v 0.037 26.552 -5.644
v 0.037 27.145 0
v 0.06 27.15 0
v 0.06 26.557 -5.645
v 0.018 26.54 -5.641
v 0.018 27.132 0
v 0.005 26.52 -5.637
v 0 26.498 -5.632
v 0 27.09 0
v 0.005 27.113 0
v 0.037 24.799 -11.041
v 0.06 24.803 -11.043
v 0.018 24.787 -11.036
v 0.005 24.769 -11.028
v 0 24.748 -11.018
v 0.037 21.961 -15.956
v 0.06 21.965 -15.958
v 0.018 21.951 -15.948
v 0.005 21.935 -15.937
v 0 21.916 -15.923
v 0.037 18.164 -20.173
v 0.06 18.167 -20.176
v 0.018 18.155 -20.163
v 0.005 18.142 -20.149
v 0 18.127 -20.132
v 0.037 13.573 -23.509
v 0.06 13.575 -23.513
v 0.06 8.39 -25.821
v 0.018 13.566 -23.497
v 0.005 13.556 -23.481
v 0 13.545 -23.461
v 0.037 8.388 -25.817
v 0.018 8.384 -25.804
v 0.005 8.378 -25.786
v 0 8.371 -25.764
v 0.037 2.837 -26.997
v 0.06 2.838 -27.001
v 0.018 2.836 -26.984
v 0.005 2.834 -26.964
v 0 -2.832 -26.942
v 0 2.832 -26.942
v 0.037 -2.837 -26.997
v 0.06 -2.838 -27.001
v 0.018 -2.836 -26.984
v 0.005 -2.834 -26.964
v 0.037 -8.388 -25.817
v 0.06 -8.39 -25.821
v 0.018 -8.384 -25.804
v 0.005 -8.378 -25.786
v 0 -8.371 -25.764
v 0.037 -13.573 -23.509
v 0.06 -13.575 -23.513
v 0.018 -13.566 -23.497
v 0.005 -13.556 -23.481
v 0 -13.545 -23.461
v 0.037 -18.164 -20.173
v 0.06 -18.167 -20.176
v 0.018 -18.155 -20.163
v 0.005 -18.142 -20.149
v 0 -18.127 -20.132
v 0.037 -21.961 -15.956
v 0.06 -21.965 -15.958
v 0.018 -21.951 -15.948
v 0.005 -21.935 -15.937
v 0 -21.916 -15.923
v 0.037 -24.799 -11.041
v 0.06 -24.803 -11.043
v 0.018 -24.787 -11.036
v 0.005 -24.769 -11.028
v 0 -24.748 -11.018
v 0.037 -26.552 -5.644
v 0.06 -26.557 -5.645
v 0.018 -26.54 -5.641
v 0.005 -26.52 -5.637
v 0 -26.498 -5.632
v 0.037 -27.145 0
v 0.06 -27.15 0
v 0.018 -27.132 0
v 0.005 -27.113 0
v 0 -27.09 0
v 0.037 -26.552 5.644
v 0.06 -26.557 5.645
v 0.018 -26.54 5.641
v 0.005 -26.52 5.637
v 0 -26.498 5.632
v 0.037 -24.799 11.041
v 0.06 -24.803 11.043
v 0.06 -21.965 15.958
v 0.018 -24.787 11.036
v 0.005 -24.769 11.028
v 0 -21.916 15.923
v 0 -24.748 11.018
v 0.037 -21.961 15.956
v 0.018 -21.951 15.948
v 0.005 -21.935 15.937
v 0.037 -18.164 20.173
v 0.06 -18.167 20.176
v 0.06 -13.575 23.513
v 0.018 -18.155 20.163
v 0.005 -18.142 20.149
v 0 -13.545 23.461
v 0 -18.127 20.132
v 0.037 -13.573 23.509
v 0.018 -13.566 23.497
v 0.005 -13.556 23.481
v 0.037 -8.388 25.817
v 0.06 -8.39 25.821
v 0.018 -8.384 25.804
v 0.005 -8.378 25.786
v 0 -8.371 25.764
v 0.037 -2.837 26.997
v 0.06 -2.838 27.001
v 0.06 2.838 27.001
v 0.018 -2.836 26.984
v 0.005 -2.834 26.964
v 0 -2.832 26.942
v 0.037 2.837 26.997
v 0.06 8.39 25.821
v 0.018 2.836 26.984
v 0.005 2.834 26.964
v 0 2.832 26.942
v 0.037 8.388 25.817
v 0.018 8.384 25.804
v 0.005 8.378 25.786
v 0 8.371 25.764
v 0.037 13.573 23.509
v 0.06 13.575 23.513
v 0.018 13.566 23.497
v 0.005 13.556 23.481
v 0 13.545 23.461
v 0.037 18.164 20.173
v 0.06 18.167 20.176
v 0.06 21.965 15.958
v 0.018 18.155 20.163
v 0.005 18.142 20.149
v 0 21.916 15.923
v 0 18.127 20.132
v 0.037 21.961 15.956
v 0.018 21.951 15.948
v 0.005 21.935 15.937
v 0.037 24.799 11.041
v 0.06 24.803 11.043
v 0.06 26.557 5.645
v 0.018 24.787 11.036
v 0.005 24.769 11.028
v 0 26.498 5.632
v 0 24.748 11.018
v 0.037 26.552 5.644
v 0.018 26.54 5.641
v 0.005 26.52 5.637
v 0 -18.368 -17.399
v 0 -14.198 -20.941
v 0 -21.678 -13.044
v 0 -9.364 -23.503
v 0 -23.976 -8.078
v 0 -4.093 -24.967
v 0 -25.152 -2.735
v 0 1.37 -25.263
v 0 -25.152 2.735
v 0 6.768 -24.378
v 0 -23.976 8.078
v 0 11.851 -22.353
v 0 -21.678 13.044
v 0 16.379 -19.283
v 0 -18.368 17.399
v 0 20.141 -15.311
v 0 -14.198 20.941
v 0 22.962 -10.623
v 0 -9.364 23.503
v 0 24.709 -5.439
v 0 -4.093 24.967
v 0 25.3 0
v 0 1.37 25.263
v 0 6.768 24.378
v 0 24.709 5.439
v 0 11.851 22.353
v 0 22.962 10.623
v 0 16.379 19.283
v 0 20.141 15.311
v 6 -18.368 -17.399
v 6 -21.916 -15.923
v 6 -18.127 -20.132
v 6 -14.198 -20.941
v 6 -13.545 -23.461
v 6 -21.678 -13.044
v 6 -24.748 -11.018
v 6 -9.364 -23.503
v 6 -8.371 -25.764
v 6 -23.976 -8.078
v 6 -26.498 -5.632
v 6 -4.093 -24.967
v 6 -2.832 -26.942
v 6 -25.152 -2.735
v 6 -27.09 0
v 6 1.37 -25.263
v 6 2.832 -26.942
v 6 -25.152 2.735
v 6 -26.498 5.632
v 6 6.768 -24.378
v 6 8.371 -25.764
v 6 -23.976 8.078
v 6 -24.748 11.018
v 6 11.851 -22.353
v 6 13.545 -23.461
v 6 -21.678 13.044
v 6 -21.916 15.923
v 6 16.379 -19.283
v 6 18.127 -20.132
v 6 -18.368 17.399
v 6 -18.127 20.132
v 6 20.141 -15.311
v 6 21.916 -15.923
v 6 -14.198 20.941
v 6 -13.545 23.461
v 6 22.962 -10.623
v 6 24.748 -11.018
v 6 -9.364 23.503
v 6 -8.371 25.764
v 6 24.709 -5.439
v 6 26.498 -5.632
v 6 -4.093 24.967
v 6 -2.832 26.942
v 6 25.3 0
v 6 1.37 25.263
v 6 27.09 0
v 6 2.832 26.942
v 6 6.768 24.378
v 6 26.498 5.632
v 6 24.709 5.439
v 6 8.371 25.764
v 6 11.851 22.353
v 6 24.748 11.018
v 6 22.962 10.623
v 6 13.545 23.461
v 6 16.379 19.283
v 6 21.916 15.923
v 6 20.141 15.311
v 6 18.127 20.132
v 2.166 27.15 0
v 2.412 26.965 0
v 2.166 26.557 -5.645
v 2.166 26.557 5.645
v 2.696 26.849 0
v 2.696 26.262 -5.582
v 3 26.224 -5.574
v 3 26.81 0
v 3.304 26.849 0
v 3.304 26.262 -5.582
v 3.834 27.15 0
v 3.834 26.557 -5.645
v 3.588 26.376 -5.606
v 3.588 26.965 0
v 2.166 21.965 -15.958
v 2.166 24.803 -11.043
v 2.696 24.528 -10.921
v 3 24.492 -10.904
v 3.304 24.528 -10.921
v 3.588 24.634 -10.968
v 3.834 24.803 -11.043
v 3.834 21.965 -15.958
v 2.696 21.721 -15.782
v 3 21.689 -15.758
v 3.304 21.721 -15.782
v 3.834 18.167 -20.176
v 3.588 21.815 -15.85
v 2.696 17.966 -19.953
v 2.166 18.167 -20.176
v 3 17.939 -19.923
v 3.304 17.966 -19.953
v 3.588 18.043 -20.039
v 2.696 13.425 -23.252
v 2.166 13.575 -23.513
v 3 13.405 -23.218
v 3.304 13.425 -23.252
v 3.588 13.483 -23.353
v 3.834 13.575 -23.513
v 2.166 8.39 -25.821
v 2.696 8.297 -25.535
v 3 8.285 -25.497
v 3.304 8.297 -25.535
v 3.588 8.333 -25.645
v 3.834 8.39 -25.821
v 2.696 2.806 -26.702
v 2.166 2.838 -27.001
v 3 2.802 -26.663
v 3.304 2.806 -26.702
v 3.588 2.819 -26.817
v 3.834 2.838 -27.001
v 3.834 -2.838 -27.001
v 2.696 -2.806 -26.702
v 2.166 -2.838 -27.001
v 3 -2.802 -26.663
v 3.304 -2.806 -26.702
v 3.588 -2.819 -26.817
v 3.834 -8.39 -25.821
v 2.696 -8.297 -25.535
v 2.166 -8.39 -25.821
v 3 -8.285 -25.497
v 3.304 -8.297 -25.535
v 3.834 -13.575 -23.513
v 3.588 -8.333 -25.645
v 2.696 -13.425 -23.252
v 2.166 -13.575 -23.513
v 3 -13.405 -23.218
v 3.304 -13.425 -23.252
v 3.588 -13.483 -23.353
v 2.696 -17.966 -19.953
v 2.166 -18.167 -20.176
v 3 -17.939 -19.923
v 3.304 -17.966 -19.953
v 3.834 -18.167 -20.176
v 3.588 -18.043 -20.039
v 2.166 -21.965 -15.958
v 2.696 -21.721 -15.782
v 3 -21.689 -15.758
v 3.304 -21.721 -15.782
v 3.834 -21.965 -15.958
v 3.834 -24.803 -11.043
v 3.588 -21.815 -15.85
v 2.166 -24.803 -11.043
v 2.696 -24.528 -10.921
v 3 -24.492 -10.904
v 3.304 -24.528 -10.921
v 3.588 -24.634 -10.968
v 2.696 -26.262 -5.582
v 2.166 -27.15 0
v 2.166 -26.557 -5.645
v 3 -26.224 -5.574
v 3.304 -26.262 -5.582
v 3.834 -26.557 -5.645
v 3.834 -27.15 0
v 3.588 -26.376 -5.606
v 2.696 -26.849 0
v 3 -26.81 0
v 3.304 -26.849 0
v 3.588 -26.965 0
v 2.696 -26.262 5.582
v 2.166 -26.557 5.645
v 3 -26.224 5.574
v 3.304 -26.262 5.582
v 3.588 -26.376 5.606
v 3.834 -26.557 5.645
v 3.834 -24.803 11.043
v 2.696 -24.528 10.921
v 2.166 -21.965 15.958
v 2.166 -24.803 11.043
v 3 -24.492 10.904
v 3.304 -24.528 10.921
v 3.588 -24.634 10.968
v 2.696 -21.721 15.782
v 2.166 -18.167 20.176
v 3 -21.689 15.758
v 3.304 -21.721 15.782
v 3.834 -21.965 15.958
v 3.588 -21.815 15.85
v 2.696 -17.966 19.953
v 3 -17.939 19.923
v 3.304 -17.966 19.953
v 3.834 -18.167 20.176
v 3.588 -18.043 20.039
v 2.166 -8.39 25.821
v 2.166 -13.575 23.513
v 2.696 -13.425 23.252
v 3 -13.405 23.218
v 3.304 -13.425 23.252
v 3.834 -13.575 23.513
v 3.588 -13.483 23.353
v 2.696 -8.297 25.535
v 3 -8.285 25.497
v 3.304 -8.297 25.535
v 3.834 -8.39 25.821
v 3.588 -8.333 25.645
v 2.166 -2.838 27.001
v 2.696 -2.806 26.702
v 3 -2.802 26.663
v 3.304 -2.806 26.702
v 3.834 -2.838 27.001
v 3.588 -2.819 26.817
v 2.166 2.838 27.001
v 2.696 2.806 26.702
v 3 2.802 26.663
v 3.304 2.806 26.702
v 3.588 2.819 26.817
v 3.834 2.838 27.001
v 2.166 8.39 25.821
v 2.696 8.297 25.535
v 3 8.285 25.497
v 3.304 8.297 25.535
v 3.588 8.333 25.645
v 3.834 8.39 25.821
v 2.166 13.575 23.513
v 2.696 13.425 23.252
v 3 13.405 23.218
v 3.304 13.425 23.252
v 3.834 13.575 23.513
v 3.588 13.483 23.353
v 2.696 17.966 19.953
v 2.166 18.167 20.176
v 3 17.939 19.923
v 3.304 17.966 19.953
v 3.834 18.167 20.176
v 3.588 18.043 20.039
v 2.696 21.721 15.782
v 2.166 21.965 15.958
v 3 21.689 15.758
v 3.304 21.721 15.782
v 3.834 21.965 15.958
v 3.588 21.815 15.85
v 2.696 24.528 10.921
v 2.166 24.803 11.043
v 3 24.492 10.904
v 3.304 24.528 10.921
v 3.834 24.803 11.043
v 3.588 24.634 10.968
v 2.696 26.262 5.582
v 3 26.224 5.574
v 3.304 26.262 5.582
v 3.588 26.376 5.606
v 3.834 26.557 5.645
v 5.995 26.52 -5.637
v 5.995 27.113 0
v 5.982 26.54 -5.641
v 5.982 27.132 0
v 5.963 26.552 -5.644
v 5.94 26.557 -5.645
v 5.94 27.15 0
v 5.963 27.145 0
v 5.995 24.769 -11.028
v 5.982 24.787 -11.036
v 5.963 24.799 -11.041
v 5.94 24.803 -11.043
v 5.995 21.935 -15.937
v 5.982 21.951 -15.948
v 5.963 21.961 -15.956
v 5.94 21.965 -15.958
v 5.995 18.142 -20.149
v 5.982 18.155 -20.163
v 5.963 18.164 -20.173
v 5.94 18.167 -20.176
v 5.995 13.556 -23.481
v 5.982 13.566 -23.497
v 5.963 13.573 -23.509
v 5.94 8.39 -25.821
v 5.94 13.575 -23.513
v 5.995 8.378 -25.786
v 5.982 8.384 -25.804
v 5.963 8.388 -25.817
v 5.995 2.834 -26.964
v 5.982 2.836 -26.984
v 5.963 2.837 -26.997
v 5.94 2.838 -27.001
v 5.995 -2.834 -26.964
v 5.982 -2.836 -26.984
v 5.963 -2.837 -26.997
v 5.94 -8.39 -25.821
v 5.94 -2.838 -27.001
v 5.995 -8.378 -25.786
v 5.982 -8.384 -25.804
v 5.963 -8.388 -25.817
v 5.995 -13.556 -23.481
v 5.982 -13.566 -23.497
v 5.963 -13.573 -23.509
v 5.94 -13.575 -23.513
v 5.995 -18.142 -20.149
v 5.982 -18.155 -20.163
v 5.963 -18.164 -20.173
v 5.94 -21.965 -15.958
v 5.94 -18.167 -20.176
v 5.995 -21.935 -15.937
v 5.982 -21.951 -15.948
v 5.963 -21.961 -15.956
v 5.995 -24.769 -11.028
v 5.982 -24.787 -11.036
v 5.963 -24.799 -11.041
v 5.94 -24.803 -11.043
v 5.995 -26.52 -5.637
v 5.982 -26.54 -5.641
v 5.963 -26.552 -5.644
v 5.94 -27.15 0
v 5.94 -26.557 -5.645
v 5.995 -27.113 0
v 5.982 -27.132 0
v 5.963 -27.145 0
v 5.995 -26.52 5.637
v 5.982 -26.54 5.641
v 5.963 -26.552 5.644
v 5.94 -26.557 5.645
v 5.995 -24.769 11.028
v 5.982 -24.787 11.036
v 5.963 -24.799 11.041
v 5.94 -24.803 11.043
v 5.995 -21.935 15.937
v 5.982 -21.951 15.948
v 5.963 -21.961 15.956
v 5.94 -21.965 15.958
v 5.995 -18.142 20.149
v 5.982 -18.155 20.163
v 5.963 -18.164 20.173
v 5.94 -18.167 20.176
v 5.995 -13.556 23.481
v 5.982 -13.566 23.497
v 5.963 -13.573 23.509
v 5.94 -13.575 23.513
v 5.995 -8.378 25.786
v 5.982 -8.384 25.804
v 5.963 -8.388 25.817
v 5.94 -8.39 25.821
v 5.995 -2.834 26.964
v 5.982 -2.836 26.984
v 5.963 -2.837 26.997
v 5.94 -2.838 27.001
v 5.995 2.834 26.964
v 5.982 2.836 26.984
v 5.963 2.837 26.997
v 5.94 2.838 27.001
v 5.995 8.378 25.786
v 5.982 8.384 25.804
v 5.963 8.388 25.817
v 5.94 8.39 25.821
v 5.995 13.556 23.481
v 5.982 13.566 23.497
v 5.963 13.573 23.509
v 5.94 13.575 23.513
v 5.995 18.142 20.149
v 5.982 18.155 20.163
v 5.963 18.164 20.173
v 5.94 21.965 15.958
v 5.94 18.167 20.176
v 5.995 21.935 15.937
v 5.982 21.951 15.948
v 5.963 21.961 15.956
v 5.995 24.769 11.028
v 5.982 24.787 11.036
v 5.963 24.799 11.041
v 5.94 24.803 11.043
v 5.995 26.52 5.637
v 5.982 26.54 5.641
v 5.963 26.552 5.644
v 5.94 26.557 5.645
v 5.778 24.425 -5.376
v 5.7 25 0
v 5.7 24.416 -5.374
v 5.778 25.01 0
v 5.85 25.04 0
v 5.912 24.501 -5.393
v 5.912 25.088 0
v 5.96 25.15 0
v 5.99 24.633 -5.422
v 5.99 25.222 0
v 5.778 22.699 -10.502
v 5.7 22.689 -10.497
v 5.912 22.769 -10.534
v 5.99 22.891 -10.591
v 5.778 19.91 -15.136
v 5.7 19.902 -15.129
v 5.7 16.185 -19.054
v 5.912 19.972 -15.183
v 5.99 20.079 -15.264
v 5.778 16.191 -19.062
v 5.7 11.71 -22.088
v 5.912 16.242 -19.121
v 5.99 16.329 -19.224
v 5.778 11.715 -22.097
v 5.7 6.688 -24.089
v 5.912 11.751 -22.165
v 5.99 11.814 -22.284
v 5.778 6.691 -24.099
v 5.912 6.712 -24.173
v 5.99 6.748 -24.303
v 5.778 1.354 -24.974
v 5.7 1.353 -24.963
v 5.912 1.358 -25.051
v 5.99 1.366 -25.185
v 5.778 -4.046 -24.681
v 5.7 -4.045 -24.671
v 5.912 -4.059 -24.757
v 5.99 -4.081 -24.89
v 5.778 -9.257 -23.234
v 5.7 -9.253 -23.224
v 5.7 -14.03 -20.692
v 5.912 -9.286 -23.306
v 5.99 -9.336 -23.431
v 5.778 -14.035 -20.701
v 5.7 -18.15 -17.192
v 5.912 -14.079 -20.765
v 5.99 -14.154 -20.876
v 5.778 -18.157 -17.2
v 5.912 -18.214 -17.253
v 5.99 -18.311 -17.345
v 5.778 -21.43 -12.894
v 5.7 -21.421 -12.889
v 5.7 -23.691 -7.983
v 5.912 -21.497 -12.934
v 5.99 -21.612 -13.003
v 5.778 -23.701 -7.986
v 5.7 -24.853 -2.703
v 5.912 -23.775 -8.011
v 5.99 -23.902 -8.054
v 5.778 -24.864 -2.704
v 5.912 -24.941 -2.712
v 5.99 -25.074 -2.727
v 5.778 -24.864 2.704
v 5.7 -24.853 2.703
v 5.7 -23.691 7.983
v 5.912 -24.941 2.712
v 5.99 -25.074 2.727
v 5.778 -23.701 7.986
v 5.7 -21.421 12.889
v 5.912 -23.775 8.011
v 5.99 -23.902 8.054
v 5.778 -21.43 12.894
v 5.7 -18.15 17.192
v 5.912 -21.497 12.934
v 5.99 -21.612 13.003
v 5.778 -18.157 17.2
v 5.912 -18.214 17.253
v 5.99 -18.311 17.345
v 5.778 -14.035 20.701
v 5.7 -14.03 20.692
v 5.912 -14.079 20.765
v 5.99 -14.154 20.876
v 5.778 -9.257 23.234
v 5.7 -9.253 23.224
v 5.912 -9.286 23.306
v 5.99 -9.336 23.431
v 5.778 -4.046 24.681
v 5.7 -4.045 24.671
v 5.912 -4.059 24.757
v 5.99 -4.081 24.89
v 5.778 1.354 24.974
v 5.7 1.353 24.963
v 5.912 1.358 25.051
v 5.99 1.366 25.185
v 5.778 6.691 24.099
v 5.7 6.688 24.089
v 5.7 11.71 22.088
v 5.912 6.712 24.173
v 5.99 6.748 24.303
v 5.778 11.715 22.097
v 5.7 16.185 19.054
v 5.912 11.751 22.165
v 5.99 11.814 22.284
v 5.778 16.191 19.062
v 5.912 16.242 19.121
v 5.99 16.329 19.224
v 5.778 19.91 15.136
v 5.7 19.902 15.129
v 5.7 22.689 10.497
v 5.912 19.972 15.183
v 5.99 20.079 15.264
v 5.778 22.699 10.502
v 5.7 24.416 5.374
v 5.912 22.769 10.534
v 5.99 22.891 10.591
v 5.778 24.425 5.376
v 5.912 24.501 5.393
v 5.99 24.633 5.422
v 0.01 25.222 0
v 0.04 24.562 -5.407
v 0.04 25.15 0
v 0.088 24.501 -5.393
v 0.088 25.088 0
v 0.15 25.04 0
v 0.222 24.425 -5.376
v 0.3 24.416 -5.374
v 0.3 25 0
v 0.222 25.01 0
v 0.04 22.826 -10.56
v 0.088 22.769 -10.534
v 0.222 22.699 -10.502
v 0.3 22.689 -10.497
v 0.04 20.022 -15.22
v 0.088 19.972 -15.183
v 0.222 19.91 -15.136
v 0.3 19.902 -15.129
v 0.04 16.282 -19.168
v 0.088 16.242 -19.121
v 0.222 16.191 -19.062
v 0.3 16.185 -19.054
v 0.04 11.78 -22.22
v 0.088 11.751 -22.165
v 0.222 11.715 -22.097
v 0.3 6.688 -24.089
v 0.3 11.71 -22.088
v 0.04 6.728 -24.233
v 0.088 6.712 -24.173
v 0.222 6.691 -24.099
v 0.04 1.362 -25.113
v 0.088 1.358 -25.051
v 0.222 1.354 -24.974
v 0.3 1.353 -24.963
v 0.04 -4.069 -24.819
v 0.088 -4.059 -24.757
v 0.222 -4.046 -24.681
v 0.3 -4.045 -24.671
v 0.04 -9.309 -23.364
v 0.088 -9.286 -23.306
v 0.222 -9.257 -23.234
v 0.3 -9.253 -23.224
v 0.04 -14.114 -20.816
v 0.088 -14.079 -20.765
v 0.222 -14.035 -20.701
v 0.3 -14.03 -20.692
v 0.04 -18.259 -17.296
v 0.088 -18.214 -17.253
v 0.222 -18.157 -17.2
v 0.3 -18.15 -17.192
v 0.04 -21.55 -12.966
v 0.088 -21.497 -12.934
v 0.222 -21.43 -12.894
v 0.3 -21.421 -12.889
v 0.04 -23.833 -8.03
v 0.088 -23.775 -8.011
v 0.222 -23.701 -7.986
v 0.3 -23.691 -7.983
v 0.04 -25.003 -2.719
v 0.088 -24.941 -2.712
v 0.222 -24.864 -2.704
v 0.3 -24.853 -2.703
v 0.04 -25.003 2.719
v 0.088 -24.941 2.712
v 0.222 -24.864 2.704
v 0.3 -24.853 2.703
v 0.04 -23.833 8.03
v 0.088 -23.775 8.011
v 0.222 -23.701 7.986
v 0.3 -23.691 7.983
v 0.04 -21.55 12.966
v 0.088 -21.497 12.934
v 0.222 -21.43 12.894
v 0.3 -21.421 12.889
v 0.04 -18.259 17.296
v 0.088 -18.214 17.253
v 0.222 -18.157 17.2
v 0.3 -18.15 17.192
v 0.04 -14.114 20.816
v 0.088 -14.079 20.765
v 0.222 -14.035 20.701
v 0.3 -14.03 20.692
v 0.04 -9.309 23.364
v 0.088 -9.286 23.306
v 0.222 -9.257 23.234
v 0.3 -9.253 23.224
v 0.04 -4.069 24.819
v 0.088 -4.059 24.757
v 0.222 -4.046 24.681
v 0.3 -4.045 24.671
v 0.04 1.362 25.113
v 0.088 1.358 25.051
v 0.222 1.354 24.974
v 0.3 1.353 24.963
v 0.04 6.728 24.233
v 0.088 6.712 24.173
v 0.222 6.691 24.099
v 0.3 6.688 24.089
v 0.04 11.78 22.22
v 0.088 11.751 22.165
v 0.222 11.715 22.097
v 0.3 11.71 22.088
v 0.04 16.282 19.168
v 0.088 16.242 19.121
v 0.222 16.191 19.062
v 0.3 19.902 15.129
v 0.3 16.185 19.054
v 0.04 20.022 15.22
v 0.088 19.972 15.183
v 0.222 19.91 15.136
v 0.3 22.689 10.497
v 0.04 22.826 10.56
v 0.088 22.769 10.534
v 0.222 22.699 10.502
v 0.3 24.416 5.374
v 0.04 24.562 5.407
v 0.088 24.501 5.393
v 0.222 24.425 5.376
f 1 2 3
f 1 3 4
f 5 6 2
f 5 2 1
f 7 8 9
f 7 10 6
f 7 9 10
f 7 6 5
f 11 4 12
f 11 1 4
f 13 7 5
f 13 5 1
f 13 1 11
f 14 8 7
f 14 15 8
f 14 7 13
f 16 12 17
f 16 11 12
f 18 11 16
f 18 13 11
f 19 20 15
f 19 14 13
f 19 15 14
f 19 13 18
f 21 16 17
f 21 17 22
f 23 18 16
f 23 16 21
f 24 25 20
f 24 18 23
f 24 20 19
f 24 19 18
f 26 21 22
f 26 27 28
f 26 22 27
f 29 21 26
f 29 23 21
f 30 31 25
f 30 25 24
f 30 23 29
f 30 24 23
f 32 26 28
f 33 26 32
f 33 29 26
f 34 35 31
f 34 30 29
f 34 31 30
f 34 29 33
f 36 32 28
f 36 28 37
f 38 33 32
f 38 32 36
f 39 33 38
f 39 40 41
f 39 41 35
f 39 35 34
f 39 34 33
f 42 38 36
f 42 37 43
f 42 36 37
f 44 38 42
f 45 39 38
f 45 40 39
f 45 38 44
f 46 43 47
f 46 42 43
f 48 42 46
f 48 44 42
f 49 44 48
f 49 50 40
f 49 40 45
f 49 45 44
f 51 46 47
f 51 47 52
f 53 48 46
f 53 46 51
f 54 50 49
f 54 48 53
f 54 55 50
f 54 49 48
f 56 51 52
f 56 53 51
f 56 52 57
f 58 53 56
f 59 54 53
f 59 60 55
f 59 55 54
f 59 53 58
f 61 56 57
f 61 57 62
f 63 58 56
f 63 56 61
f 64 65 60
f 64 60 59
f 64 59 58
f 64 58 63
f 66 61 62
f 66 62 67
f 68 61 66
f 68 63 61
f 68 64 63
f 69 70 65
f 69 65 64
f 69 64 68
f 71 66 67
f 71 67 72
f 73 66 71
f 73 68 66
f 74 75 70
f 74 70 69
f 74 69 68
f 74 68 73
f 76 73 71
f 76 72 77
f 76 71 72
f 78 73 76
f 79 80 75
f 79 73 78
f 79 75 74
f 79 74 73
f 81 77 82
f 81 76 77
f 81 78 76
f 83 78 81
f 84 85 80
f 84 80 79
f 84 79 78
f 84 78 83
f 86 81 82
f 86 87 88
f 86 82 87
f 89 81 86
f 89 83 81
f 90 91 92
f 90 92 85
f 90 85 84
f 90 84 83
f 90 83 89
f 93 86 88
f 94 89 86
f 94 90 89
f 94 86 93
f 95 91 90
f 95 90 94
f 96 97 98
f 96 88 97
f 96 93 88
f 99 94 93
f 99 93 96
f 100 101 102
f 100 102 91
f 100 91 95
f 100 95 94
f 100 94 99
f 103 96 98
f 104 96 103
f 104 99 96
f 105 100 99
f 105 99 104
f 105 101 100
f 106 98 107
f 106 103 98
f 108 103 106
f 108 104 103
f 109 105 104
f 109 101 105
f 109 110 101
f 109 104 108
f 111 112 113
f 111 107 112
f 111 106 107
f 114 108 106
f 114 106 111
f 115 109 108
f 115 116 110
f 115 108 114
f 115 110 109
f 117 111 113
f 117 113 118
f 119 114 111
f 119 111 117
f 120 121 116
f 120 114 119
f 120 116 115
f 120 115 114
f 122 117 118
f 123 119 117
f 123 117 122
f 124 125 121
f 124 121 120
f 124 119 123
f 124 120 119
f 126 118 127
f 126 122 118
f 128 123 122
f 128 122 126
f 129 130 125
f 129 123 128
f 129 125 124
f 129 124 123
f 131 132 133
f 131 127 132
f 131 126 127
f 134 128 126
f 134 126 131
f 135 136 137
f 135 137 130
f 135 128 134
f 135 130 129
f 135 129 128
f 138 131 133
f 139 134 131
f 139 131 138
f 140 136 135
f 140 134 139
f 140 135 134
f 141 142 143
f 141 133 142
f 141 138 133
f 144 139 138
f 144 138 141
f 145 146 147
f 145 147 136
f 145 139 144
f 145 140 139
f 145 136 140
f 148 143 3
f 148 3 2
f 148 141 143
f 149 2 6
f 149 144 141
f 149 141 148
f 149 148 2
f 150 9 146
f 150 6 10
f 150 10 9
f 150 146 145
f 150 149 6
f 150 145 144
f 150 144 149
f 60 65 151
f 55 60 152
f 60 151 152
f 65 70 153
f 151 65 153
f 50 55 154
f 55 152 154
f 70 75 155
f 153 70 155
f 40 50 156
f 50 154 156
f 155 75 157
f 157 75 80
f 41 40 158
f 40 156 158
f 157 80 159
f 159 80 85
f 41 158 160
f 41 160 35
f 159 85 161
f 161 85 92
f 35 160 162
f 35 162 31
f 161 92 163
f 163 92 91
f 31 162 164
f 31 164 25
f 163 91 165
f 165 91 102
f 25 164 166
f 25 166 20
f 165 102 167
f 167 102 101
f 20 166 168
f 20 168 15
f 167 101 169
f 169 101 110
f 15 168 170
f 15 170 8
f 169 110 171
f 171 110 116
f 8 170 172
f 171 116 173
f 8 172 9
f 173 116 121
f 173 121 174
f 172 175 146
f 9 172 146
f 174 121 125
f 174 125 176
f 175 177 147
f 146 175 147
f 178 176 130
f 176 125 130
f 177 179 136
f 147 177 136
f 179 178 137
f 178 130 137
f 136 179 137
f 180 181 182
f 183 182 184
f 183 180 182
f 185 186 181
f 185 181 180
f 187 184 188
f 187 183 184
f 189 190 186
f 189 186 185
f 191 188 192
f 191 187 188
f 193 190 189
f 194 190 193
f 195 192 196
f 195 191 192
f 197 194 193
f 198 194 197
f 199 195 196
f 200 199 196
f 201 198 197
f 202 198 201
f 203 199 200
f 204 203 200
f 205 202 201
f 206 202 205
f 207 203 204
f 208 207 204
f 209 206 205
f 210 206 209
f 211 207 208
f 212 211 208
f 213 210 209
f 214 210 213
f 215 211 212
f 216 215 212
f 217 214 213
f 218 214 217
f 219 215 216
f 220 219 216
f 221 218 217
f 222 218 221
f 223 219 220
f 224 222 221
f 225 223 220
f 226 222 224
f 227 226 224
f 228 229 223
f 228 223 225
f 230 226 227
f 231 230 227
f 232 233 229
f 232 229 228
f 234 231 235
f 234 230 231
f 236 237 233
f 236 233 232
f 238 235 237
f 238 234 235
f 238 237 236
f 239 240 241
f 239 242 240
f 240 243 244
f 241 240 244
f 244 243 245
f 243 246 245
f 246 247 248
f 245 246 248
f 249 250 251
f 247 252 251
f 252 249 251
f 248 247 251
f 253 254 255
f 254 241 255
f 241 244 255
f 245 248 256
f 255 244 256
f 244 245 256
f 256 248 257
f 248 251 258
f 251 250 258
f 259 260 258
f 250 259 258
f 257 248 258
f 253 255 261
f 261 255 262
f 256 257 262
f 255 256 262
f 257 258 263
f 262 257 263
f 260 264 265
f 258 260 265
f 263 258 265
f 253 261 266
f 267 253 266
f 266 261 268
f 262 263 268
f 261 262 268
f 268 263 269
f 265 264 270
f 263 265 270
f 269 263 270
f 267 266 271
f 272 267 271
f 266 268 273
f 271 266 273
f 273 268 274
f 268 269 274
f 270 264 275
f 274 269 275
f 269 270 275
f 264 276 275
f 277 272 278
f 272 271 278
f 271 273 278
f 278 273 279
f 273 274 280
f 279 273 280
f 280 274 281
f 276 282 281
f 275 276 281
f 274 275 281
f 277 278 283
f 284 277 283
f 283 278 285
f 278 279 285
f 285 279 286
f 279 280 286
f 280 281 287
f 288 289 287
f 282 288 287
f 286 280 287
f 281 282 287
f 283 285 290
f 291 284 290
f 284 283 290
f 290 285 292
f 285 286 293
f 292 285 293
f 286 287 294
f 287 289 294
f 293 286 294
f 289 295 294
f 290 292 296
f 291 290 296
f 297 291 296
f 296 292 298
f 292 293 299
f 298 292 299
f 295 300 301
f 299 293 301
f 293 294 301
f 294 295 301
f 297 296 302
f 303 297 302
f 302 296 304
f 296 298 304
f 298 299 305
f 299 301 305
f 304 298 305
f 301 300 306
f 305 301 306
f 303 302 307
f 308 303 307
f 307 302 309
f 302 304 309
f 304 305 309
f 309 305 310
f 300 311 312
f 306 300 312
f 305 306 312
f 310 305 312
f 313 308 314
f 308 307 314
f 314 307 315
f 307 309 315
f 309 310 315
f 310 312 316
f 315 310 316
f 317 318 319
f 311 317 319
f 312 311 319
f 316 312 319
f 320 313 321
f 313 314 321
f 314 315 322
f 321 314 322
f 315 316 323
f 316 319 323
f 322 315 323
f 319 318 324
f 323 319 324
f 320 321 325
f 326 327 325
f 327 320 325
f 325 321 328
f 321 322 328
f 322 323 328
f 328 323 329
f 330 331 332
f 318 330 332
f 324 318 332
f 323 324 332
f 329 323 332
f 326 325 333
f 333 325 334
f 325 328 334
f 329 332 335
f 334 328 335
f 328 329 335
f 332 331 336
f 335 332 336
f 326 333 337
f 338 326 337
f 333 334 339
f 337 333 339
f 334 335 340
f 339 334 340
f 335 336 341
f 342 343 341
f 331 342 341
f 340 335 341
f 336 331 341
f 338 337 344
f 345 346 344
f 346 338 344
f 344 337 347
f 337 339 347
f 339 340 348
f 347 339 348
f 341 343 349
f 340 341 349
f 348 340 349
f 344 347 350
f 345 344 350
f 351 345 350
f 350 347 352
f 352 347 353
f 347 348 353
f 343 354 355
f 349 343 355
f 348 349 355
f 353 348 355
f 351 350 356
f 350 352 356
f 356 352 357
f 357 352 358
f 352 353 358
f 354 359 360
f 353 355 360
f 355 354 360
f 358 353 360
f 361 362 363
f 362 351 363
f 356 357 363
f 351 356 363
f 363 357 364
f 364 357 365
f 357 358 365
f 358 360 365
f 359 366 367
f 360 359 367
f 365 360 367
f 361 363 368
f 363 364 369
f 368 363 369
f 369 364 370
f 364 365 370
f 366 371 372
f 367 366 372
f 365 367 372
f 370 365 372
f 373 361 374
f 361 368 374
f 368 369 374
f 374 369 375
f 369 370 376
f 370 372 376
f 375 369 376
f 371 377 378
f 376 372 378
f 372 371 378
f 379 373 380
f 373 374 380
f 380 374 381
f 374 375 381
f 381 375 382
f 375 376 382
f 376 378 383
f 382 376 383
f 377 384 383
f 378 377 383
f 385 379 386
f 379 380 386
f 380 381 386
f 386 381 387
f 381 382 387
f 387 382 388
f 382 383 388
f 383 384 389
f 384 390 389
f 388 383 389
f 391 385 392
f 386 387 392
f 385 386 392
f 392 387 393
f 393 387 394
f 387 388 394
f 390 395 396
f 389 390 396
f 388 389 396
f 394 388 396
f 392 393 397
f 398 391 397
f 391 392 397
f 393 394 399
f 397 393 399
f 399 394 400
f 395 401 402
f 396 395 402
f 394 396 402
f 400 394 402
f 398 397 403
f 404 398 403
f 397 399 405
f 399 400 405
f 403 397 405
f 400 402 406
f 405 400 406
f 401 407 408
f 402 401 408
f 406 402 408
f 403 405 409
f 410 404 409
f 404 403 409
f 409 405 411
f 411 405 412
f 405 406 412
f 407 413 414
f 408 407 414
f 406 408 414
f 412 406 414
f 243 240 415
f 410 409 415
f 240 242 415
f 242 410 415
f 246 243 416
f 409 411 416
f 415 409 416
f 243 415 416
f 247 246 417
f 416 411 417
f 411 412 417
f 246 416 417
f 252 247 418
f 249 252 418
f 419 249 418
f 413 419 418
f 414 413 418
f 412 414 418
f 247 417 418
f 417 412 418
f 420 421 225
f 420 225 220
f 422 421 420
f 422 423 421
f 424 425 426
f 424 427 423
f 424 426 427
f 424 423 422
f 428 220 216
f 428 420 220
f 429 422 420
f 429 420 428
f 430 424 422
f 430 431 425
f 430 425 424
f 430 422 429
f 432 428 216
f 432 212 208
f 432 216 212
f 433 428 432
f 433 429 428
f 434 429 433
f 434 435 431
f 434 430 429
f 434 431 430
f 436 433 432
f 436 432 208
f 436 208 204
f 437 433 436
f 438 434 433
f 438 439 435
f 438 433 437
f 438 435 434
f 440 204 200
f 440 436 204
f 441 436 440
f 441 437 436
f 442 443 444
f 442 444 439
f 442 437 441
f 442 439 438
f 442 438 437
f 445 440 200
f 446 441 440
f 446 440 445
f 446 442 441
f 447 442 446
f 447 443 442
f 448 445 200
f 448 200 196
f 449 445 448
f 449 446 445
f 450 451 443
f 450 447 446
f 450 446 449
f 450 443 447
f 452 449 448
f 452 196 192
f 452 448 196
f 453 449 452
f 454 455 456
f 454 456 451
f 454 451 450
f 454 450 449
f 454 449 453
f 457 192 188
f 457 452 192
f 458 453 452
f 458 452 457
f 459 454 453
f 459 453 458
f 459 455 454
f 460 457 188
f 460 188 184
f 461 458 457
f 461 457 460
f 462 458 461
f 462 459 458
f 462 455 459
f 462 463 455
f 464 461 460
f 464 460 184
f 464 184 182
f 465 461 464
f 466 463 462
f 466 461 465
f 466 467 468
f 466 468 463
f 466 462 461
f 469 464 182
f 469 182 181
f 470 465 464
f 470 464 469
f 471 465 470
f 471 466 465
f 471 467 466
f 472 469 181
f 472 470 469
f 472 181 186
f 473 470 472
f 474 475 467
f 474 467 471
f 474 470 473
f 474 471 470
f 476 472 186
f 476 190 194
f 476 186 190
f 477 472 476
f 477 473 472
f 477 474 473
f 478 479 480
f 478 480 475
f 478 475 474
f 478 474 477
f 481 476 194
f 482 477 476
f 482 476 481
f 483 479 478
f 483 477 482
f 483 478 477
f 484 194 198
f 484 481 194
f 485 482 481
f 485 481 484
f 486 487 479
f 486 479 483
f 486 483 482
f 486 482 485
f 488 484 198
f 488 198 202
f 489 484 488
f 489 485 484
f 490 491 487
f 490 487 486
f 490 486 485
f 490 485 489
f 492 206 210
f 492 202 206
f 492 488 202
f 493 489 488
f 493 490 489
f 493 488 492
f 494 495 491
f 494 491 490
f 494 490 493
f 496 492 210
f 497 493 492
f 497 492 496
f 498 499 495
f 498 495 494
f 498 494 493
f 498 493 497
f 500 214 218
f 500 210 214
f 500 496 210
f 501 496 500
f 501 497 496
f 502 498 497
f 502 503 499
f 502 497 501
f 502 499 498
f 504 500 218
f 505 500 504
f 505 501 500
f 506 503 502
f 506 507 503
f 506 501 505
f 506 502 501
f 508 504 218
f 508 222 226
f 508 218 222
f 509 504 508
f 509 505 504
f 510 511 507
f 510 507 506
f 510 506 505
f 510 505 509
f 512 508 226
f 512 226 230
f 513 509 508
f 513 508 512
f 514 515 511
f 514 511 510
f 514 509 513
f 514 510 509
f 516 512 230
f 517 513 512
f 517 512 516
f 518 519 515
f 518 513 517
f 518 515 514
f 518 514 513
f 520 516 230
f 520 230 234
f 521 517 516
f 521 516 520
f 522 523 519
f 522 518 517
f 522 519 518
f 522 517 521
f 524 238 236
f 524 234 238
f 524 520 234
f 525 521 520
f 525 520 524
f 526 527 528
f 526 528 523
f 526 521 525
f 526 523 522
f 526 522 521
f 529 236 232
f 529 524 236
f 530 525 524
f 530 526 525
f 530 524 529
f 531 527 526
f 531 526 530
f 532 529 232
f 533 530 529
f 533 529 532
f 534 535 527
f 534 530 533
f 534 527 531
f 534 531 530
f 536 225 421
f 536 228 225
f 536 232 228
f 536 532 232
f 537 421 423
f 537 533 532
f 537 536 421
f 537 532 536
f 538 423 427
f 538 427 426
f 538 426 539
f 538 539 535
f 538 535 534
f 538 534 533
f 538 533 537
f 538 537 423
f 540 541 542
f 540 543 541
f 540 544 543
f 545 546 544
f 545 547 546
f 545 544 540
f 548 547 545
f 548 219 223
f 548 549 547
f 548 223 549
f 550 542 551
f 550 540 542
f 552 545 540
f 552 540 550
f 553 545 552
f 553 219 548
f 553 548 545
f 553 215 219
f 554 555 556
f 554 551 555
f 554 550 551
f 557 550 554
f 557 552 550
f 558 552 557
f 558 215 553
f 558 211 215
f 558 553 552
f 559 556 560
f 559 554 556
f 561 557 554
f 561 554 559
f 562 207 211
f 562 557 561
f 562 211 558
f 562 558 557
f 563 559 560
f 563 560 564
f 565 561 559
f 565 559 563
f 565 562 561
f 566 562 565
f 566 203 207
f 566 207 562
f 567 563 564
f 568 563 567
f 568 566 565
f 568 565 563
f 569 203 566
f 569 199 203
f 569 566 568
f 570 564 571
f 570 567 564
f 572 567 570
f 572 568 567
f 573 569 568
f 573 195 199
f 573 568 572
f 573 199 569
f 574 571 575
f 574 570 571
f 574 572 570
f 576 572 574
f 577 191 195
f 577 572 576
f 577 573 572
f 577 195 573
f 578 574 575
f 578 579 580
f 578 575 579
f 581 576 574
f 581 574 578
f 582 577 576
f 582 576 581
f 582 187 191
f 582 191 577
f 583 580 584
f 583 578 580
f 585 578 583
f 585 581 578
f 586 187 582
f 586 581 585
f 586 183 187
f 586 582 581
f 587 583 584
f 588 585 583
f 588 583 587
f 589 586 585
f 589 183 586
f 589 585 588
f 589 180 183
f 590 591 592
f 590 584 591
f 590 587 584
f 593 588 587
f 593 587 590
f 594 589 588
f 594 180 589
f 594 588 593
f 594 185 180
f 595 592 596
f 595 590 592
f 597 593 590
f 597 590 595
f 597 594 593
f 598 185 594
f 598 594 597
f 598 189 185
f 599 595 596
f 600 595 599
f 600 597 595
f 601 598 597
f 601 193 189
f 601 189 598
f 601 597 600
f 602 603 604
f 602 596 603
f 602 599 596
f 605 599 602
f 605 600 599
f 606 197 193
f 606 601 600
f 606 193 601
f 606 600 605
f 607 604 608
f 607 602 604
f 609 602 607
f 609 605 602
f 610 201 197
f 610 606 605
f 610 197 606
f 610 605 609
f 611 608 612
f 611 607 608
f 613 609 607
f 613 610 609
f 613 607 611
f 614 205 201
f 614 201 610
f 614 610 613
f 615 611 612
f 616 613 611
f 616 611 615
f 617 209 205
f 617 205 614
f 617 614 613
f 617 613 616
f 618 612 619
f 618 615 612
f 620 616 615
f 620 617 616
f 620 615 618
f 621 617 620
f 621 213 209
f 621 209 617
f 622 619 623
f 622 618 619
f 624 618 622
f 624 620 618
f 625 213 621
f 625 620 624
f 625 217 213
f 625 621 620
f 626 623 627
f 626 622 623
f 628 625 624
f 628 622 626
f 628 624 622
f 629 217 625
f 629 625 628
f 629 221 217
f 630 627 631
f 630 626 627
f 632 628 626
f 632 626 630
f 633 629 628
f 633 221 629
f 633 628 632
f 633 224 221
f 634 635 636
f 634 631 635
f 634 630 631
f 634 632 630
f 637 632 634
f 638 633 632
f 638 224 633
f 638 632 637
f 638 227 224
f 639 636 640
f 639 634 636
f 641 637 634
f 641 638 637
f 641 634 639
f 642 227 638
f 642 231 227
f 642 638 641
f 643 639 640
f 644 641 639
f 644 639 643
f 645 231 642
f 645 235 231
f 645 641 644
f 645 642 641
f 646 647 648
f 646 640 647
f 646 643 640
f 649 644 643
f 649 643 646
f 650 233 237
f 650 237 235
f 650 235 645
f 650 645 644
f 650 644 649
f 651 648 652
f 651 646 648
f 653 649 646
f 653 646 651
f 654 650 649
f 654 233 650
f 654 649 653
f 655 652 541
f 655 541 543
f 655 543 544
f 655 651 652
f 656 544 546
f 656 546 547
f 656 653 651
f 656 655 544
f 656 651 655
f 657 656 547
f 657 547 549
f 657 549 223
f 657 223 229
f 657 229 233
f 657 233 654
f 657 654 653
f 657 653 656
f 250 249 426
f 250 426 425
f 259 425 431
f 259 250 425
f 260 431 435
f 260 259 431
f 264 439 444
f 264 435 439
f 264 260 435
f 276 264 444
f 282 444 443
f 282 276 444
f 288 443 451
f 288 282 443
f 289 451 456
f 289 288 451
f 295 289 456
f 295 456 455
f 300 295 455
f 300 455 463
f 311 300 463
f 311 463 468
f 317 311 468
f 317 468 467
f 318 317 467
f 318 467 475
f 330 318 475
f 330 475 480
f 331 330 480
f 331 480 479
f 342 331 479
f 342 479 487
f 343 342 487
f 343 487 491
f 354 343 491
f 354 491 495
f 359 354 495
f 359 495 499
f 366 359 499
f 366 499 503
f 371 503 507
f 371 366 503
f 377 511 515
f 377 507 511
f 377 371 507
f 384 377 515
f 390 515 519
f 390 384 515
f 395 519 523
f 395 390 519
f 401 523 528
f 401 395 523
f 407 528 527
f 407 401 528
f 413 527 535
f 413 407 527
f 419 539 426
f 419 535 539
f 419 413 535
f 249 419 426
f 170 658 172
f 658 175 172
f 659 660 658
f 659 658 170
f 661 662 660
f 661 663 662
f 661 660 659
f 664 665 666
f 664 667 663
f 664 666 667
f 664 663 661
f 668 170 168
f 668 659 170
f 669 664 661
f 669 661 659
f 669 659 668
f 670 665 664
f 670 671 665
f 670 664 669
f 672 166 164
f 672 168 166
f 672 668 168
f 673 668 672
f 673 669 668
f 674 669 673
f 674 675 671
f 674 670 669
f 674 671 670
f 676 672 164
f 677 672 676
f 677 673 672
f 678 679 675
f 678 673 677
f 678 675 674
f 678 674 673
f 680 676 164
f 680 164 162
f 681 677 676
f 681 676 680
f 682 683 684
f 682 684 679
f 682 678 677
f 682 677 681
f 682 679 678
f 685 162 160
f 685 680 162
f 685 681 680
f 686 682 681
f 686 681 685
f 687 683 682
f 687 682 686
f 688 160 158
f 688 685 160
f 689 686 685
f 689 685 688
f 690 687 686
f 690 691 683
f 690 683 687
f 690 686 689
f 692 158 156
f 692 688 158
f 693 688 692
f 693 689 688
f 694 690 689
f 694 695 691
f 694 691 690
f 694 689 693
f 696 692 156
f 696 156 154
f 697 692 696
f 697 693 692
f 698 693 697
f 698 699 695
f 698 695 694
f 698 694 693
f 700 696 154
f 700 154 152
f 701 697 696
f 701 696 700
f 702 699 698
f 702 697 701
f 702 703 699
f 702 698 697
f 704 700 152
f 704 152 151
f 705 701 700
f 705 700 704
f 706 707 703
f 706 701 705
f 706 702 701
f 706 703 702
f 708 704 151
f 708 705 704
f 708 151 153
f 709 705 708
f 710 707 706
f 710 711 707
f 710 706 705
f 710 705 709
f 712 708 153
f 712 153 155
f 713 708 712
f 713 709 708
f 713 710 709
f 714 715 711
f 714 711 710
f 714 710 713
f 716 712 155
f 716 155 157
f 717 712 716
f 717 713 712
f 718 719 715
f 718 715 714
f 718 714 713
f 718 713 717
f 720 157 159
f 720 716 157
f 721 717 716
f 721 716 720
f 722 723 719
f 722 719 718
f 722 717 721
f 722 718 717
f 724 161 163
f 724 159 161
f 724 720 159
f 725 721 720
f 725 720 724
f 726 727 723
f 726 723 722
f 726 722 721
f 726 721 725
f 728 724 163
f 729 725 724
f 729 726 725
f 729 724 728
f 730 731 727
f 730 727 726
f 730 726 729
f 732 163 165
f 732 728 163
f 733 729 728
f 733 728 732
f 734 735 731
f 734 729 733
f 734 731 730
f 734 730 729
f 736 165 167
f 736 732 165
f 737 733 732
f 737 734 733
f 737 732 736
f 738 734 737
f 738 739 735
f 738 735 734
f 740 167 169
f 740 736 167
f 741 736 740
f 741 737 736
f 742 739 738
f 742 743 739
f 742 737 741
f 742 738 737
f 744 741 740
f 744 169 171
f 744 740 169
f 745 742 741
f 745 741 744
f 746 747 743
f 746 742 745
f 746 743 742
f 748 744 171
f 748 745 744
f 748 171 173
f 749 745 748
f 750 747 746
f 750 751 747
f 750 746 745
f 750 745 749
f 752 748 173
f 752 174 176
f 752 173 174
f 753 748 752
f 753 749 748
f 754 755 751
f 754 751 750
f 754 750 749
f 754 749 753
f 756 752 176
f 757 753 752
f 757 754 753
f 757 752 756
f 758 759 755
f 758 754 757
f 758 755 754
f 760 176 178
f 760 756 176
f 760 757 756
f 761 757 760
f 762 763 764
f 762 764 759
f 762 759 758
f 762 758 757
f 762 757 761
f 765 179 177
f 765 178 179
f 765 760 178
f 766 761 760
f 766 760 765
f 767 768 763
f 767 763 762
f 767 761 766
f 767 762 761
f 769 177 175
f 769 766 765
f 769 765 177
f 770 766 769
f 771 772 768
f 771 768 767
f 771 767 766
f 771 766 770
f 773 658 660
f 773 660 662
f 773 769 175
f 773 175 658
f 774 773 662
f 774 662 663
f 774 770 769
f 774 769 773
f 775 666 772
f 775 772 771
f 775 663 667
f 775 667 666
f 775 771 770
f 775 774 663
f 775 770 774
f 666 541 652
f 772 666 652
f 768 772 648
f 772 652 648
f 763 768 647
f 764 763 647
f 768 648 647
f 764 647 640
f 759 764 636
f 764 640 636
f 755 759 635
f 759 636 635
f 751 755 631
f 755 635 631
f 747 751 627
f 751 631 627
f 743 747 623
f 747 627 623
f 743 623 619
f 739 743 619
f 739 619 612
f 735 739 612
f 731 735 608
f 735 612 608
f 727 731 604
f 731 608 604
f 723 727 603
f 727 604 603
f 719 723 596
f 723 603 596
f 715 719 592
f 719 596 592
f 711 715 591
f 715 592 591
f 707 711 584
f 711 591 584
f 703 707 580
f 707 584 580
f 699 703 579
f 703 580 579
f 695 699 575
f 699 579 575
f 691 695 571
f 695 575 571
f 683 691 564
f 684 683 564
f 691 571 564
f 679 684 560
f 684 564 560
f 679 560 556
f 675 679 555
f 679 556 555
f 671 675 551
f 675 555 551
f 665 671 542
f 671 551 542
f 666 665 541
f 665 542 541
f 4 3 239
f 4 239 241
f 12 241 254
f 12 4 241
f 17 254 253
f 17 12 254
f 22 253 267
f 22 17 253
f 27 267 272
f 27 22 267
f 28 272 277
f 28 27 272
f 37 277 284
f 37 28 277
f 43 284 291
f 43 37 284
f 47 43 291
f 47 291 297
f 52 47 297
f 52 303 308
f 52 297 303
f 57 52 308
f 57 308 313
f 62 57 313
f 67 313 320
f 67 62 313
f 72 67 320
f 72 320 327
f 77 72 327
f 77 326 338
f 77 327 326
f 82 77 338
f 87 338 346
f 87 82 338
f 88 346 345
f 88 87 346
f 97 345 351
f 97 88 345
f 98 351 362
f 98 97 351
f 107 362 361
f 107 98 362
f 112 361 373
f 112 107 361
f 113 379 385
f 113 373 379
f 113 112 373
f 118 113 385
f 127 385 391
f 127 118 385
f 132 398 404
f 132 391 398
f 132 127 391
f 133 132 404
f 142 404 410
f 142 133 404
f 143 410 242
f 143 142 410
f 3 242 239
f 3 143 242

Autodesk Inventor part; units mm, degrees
sketch "Sketch_10" plane through (0, 0, 0) normal (0, 0, 1) x (1, 0, 0)
  line L0 (50, 0) -> (-50, 0)
  line L1 (0, 27.09) -> (0, 25.3)
  arc A0 (0, 25.3) -> (0.3, 25) centre (0.3, 25.3) ccw
  line L2 (0.3, 25) -> (5.7, 25)
  arc A1 (5.7, 25) -> (6, 25.3) centre (5.7, 25.3) ccw
  line L3 (6, 25.3) -> (6, 27.09)
  arc A2 (6, 27.09) -> (5.94, 27.15) centre (5.94, 27.09) ccw
  line L4 (5.94, 27.15) -> (3.8335, 27.15)
  arc A3 (2.1665, 27.15) -> (3.8335, 27.15) centre (3, 28) ccw
  line L5 (2.1665, 27.15) -> (0.06, 27.15)
  arc A4 (0.06, 27.15) -> (0, 27.09) centre (0.06, 27.09) ccw
revolve "Revolution1" add sketch "Sketch_10" angle 360 about axis through (50, 0, 0) along (1, 0, 0)
ref_plane "ir_XY" through (0, 0, 0) normal (0, 0, 1) x (1, 0, 0)
ref_plane "ir_YZ" through (0, 0, 0) normal (1, 0, 0) x (0, 1, 0)
ref_plane "ir_ZX" through (0, 0, 0) normal (0, 1, 0) x (0, 0, 1)
properties part number "SKF_W 61710_ir"
